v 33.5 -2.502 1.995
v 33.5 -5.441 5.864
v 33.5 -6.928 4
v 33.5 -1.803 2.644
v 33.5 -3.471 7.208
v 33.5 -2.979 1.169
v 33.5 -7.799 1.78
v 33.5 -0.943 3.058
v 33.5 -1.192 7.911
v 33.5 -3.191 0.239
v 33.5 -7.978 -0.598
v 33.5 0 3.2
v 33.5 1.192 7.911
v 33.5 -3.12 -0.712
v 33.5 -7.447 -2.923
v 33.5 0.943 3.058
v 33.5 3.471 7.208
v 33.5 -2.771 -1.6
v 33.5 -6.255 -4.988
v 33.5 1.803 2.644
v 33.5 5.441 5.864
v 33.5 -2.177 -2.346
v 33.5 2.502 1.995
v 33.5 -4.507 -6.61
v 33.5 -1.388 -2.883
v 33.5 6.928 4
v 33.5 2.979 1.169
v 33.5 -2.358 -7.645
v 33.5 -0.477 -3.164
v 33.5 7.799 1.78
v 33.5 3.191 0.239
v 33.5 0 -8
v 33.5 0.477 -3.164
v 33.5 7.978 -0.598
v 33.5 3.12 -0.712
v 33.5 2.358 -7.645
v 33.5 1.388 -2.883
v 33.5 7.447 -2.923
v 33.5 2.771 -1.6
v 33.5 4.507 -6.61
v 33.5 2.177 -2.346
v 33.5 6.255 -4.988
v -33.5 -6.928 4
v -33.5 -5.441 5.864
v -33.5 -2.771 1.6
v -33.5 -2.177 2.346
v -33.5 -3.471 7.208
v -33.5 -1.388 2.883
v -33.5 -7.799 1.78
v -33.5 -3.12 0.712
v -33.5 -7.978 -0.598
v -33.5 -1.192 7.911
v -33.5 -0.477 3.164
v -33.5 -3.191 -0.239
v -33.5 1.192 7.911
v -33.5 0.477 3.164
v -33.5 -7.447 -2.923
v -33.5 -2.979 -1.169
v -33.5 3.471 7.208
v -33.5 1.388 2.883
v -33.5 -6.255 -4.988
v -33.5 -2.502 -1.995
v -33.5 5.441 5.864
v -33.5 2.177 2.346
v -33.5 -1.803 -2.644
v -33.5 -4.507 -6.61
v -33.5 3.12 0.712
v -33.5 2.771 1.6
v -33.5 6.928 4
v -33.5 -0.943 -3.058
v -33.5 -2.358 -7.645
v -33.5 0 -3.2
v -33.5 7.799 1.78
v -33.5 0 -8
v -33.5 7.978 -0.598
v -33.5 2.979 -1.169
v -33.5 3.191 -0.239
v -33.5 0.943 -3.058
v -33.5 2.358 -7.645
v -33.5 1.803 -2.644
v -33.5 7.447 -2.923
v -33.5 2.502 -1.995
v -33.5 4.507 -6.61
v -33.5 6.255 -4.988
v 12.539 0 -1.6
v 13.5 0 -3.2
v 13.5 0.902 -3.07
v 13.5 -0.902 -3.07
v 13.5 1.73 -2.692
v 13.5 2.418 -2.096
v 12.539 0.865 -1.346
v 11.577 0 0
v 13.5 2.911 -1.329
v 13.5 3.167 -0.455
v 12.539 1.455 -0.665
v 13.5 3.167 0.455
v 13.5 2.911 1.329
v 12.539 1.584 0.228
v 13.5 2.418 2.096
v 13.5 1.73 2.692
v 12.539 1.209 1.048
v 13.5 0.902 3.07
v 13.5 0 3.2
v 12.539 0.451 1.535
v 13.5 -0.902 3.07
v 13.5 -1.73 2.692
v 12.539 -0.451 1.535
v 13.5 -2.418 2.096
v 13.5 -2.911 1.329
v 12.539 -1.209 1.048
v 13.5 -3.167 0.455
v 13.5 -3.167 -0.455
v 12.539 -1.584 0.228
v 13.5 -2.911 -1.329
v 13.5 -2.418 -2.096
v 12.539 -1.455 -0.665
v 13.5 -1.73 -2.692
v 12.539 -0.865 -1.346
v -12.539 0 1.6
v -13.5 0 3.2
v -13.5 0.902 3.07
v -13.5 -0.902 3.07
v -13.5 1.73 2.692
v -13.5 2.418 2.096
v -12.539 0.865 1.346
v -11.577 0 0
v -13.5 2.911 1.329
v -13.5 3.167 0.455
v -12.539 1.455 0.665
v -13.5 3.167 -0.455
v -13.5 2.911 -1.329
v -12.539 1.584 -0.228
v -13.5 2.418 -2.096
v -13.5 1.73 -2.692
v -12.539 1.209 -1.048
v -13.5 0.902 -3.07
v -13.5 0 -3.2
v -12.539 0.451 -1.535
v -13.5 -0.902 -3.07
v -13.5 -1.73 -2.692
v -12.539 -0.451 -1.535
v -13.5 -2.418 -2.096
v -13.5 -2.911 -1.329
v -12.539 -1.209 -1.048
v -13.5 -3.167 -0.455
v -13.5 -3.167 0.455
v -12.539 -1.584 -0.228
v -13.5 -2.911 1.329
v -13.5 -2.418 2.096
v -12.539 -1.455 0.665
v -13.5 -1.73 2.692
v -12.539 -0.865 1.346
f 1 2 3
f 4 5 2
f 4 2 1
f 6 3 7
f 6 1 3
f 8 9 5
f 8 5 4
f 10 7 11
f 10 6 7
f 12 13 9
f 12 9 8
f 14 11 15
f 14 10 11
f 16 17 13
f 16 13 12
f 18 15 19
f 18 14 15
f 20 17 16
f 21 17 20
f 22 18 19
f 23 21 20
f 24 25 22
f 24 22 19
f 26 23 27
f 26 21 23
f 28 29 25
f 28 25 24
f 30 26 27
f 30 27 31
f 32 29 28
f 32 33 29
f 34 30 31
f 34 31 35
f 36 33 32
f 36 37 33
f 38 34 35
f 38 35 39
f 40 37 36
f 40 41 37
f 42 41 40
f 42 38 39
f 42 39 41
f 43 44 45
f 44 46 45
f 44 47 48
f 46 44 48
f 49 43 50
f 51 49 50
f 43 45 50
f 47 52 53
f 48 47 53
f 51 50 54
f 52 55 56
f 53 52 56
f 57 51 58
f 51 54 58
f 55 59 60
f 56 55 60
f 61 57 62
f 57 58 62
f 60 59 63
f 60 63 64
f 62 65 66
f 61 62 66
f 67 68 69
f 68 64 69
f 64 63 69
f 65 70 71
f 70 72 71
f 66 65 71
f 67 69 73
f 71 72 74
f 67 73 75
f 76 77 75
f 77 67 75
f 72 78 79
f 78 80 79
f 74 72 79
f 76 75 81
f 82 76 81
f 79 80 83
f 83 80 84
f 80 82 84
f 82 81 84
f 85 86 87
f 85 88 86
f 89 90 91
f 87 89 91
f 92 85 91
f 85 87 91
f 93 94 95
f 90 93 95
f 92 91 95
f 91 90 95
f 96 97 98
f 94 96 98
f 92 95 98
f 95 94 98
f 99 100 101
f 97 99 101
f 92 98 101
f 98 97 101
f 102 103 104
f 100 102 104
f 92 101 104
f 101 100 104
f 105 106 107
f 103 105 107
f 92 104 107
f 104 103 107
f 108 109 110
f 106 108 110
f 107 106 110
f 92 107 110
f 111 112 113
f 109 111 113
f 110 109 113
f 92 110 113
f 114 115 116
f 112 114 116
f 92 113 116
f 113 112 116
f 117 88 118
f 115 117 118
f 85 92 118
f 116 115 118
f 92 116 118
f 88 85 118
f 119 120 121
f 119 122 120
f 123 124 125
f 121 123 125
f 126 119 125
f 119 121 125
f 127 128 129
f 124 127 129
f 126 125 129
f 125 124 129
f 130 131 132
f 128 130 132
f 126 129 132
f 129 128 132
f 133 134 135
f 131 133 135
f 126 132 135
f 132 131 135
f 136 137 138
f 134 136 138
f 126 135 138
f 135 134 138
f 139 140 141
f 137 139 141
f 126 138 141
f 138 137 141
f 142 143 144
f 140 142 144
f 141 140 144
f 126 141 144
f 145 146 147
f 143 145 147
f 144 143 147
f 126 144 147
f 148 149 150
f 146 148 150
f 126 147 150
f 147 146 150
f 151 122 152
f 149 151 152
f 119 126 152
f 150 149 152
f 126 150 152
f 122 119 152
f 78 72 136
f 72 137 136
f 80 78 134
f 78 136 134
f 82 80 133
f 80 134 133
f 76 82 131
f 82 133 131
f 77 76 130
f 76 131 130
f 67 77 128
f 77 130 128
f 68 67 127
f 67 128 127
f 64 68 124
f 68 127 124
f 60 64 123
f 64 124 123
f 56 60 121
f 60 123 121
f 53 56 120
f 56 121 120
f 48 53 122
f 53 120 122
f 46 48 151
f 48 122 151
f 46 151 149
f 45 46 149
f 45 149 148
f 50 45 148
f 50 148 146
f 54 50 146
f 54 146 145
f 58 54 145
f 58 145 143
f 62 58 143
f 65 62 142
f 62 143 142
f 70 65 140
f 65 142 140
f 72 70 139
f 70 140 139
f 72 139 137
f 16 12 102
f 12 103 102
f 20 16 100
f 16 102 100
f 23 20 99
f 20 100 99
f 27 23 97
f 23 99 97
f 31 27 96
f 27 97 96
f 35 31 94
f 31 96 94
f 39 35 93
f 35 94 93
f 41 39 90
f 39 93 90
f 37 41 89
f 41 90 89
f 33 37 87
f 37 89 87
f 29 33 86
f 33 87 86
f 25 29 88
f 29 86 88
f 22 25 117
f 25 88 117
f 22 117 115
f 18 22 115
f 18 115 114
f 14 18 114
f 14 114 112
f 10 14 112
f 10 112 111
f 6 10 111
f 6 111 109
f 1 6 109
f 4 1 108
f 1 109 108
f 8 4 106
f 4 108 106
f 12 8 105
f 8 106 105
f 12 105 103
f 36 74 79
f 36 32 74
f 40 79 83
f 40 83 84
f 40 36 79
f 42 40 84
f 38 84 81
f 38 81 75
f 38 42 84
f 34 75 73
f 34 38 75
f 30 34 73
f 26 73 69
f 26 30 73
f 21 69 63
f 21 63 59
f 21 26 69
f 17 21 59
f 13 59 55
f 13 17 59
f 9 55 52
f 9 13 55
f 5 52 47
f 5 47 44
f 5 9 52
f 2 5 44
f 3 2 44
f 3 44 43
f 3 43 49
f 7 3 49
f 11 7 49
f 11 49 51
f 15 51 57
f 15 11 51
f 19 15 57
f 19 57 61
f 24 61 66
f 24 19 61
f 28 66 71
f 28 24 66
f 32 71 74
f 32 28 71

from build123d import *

# Parameters (mm, degrees)
CROQUIS1_R                       = 8
SALIENTE_EXTRUIR1_DEPTH          = 33.5
TALADRO_DE_MARGEN_PARA_M61_D     = 6.4
TALADRO_DE_MARGEN_PARA_M61_DEPTH = 20
TALADRO_DE_MARGEN_PARA_M61_TIP   = 1.922753981
TALADRO_DE_MARGEN_PARA_M62_D     = 6.4
TALADRO_DE_MARGEN_PARA_M62_DEPTH = 20
TALADRO_DE_MARGEN_PARA_M62_TIP   = 1.922753981


with BuildPart() as part:
    # Croquis1 → Saliente-Extruir1 (new body, symmetric)
    with BuildSketch(Plane(origin=(0, 0, 0), x_dir=(0, 0, -1), z_dir=(1, 0, 0))):
        Circle(CROQUIS1_R)
    extrude(amount=SALIENTE_EXTRUIR1_DEPTH, both=True)

    # Taladro de margen para M61
    with Locations(Plane.ZY.offset(33.5)):
        with Locations((0, 0)):
            Hole(TALADRO_DE_MARGEN_PARA_M61_D / 2, depth=TALADRO_DE_MARGEN_PARA_M61_DEPTH)
            with Locations((0, 0, -(TALADRO_DE_MARGEN_PARA_M61_DEPTH + TALADRO_DE_MARGEN_PARA_M61_TIP / 2))):  # 118° drill point
                Cone(0, TALADRO_DE_MARGEN_PARA_M61_D / 2, TALADRO_DE_MARGEN_PARA_M61_TIP, mode=Mode.SUBTRACT)

    # Taladro de margen para M62
    with Locations(Plane(origin=(33.5, 0, 0), x_dir=(0, 0, -1), z_dir=(1, 0, 0))):
        with Locations((0, 0)):
            Hole(TALADRO_DE_MARGEN_PARA_M62_D / 2, depth=TALADRO_DE_MARGEN_PARA_M62_DEPTH)
            with Locations((0, 0, -(TALADRO_DE_MARGEN_PARA_M62_DEPTH + TALADRO_DE_MARGEN_PARA_M62_TIP / 2))):  # 118° drill point
                Cone(0, TALADRO_DE_MARGEN_PARA_M62_D / 2, TALADRO_DE_MARGEN_PARA_M62_TIP, mode=Mode.SUBTRACT)


solid = part.part
